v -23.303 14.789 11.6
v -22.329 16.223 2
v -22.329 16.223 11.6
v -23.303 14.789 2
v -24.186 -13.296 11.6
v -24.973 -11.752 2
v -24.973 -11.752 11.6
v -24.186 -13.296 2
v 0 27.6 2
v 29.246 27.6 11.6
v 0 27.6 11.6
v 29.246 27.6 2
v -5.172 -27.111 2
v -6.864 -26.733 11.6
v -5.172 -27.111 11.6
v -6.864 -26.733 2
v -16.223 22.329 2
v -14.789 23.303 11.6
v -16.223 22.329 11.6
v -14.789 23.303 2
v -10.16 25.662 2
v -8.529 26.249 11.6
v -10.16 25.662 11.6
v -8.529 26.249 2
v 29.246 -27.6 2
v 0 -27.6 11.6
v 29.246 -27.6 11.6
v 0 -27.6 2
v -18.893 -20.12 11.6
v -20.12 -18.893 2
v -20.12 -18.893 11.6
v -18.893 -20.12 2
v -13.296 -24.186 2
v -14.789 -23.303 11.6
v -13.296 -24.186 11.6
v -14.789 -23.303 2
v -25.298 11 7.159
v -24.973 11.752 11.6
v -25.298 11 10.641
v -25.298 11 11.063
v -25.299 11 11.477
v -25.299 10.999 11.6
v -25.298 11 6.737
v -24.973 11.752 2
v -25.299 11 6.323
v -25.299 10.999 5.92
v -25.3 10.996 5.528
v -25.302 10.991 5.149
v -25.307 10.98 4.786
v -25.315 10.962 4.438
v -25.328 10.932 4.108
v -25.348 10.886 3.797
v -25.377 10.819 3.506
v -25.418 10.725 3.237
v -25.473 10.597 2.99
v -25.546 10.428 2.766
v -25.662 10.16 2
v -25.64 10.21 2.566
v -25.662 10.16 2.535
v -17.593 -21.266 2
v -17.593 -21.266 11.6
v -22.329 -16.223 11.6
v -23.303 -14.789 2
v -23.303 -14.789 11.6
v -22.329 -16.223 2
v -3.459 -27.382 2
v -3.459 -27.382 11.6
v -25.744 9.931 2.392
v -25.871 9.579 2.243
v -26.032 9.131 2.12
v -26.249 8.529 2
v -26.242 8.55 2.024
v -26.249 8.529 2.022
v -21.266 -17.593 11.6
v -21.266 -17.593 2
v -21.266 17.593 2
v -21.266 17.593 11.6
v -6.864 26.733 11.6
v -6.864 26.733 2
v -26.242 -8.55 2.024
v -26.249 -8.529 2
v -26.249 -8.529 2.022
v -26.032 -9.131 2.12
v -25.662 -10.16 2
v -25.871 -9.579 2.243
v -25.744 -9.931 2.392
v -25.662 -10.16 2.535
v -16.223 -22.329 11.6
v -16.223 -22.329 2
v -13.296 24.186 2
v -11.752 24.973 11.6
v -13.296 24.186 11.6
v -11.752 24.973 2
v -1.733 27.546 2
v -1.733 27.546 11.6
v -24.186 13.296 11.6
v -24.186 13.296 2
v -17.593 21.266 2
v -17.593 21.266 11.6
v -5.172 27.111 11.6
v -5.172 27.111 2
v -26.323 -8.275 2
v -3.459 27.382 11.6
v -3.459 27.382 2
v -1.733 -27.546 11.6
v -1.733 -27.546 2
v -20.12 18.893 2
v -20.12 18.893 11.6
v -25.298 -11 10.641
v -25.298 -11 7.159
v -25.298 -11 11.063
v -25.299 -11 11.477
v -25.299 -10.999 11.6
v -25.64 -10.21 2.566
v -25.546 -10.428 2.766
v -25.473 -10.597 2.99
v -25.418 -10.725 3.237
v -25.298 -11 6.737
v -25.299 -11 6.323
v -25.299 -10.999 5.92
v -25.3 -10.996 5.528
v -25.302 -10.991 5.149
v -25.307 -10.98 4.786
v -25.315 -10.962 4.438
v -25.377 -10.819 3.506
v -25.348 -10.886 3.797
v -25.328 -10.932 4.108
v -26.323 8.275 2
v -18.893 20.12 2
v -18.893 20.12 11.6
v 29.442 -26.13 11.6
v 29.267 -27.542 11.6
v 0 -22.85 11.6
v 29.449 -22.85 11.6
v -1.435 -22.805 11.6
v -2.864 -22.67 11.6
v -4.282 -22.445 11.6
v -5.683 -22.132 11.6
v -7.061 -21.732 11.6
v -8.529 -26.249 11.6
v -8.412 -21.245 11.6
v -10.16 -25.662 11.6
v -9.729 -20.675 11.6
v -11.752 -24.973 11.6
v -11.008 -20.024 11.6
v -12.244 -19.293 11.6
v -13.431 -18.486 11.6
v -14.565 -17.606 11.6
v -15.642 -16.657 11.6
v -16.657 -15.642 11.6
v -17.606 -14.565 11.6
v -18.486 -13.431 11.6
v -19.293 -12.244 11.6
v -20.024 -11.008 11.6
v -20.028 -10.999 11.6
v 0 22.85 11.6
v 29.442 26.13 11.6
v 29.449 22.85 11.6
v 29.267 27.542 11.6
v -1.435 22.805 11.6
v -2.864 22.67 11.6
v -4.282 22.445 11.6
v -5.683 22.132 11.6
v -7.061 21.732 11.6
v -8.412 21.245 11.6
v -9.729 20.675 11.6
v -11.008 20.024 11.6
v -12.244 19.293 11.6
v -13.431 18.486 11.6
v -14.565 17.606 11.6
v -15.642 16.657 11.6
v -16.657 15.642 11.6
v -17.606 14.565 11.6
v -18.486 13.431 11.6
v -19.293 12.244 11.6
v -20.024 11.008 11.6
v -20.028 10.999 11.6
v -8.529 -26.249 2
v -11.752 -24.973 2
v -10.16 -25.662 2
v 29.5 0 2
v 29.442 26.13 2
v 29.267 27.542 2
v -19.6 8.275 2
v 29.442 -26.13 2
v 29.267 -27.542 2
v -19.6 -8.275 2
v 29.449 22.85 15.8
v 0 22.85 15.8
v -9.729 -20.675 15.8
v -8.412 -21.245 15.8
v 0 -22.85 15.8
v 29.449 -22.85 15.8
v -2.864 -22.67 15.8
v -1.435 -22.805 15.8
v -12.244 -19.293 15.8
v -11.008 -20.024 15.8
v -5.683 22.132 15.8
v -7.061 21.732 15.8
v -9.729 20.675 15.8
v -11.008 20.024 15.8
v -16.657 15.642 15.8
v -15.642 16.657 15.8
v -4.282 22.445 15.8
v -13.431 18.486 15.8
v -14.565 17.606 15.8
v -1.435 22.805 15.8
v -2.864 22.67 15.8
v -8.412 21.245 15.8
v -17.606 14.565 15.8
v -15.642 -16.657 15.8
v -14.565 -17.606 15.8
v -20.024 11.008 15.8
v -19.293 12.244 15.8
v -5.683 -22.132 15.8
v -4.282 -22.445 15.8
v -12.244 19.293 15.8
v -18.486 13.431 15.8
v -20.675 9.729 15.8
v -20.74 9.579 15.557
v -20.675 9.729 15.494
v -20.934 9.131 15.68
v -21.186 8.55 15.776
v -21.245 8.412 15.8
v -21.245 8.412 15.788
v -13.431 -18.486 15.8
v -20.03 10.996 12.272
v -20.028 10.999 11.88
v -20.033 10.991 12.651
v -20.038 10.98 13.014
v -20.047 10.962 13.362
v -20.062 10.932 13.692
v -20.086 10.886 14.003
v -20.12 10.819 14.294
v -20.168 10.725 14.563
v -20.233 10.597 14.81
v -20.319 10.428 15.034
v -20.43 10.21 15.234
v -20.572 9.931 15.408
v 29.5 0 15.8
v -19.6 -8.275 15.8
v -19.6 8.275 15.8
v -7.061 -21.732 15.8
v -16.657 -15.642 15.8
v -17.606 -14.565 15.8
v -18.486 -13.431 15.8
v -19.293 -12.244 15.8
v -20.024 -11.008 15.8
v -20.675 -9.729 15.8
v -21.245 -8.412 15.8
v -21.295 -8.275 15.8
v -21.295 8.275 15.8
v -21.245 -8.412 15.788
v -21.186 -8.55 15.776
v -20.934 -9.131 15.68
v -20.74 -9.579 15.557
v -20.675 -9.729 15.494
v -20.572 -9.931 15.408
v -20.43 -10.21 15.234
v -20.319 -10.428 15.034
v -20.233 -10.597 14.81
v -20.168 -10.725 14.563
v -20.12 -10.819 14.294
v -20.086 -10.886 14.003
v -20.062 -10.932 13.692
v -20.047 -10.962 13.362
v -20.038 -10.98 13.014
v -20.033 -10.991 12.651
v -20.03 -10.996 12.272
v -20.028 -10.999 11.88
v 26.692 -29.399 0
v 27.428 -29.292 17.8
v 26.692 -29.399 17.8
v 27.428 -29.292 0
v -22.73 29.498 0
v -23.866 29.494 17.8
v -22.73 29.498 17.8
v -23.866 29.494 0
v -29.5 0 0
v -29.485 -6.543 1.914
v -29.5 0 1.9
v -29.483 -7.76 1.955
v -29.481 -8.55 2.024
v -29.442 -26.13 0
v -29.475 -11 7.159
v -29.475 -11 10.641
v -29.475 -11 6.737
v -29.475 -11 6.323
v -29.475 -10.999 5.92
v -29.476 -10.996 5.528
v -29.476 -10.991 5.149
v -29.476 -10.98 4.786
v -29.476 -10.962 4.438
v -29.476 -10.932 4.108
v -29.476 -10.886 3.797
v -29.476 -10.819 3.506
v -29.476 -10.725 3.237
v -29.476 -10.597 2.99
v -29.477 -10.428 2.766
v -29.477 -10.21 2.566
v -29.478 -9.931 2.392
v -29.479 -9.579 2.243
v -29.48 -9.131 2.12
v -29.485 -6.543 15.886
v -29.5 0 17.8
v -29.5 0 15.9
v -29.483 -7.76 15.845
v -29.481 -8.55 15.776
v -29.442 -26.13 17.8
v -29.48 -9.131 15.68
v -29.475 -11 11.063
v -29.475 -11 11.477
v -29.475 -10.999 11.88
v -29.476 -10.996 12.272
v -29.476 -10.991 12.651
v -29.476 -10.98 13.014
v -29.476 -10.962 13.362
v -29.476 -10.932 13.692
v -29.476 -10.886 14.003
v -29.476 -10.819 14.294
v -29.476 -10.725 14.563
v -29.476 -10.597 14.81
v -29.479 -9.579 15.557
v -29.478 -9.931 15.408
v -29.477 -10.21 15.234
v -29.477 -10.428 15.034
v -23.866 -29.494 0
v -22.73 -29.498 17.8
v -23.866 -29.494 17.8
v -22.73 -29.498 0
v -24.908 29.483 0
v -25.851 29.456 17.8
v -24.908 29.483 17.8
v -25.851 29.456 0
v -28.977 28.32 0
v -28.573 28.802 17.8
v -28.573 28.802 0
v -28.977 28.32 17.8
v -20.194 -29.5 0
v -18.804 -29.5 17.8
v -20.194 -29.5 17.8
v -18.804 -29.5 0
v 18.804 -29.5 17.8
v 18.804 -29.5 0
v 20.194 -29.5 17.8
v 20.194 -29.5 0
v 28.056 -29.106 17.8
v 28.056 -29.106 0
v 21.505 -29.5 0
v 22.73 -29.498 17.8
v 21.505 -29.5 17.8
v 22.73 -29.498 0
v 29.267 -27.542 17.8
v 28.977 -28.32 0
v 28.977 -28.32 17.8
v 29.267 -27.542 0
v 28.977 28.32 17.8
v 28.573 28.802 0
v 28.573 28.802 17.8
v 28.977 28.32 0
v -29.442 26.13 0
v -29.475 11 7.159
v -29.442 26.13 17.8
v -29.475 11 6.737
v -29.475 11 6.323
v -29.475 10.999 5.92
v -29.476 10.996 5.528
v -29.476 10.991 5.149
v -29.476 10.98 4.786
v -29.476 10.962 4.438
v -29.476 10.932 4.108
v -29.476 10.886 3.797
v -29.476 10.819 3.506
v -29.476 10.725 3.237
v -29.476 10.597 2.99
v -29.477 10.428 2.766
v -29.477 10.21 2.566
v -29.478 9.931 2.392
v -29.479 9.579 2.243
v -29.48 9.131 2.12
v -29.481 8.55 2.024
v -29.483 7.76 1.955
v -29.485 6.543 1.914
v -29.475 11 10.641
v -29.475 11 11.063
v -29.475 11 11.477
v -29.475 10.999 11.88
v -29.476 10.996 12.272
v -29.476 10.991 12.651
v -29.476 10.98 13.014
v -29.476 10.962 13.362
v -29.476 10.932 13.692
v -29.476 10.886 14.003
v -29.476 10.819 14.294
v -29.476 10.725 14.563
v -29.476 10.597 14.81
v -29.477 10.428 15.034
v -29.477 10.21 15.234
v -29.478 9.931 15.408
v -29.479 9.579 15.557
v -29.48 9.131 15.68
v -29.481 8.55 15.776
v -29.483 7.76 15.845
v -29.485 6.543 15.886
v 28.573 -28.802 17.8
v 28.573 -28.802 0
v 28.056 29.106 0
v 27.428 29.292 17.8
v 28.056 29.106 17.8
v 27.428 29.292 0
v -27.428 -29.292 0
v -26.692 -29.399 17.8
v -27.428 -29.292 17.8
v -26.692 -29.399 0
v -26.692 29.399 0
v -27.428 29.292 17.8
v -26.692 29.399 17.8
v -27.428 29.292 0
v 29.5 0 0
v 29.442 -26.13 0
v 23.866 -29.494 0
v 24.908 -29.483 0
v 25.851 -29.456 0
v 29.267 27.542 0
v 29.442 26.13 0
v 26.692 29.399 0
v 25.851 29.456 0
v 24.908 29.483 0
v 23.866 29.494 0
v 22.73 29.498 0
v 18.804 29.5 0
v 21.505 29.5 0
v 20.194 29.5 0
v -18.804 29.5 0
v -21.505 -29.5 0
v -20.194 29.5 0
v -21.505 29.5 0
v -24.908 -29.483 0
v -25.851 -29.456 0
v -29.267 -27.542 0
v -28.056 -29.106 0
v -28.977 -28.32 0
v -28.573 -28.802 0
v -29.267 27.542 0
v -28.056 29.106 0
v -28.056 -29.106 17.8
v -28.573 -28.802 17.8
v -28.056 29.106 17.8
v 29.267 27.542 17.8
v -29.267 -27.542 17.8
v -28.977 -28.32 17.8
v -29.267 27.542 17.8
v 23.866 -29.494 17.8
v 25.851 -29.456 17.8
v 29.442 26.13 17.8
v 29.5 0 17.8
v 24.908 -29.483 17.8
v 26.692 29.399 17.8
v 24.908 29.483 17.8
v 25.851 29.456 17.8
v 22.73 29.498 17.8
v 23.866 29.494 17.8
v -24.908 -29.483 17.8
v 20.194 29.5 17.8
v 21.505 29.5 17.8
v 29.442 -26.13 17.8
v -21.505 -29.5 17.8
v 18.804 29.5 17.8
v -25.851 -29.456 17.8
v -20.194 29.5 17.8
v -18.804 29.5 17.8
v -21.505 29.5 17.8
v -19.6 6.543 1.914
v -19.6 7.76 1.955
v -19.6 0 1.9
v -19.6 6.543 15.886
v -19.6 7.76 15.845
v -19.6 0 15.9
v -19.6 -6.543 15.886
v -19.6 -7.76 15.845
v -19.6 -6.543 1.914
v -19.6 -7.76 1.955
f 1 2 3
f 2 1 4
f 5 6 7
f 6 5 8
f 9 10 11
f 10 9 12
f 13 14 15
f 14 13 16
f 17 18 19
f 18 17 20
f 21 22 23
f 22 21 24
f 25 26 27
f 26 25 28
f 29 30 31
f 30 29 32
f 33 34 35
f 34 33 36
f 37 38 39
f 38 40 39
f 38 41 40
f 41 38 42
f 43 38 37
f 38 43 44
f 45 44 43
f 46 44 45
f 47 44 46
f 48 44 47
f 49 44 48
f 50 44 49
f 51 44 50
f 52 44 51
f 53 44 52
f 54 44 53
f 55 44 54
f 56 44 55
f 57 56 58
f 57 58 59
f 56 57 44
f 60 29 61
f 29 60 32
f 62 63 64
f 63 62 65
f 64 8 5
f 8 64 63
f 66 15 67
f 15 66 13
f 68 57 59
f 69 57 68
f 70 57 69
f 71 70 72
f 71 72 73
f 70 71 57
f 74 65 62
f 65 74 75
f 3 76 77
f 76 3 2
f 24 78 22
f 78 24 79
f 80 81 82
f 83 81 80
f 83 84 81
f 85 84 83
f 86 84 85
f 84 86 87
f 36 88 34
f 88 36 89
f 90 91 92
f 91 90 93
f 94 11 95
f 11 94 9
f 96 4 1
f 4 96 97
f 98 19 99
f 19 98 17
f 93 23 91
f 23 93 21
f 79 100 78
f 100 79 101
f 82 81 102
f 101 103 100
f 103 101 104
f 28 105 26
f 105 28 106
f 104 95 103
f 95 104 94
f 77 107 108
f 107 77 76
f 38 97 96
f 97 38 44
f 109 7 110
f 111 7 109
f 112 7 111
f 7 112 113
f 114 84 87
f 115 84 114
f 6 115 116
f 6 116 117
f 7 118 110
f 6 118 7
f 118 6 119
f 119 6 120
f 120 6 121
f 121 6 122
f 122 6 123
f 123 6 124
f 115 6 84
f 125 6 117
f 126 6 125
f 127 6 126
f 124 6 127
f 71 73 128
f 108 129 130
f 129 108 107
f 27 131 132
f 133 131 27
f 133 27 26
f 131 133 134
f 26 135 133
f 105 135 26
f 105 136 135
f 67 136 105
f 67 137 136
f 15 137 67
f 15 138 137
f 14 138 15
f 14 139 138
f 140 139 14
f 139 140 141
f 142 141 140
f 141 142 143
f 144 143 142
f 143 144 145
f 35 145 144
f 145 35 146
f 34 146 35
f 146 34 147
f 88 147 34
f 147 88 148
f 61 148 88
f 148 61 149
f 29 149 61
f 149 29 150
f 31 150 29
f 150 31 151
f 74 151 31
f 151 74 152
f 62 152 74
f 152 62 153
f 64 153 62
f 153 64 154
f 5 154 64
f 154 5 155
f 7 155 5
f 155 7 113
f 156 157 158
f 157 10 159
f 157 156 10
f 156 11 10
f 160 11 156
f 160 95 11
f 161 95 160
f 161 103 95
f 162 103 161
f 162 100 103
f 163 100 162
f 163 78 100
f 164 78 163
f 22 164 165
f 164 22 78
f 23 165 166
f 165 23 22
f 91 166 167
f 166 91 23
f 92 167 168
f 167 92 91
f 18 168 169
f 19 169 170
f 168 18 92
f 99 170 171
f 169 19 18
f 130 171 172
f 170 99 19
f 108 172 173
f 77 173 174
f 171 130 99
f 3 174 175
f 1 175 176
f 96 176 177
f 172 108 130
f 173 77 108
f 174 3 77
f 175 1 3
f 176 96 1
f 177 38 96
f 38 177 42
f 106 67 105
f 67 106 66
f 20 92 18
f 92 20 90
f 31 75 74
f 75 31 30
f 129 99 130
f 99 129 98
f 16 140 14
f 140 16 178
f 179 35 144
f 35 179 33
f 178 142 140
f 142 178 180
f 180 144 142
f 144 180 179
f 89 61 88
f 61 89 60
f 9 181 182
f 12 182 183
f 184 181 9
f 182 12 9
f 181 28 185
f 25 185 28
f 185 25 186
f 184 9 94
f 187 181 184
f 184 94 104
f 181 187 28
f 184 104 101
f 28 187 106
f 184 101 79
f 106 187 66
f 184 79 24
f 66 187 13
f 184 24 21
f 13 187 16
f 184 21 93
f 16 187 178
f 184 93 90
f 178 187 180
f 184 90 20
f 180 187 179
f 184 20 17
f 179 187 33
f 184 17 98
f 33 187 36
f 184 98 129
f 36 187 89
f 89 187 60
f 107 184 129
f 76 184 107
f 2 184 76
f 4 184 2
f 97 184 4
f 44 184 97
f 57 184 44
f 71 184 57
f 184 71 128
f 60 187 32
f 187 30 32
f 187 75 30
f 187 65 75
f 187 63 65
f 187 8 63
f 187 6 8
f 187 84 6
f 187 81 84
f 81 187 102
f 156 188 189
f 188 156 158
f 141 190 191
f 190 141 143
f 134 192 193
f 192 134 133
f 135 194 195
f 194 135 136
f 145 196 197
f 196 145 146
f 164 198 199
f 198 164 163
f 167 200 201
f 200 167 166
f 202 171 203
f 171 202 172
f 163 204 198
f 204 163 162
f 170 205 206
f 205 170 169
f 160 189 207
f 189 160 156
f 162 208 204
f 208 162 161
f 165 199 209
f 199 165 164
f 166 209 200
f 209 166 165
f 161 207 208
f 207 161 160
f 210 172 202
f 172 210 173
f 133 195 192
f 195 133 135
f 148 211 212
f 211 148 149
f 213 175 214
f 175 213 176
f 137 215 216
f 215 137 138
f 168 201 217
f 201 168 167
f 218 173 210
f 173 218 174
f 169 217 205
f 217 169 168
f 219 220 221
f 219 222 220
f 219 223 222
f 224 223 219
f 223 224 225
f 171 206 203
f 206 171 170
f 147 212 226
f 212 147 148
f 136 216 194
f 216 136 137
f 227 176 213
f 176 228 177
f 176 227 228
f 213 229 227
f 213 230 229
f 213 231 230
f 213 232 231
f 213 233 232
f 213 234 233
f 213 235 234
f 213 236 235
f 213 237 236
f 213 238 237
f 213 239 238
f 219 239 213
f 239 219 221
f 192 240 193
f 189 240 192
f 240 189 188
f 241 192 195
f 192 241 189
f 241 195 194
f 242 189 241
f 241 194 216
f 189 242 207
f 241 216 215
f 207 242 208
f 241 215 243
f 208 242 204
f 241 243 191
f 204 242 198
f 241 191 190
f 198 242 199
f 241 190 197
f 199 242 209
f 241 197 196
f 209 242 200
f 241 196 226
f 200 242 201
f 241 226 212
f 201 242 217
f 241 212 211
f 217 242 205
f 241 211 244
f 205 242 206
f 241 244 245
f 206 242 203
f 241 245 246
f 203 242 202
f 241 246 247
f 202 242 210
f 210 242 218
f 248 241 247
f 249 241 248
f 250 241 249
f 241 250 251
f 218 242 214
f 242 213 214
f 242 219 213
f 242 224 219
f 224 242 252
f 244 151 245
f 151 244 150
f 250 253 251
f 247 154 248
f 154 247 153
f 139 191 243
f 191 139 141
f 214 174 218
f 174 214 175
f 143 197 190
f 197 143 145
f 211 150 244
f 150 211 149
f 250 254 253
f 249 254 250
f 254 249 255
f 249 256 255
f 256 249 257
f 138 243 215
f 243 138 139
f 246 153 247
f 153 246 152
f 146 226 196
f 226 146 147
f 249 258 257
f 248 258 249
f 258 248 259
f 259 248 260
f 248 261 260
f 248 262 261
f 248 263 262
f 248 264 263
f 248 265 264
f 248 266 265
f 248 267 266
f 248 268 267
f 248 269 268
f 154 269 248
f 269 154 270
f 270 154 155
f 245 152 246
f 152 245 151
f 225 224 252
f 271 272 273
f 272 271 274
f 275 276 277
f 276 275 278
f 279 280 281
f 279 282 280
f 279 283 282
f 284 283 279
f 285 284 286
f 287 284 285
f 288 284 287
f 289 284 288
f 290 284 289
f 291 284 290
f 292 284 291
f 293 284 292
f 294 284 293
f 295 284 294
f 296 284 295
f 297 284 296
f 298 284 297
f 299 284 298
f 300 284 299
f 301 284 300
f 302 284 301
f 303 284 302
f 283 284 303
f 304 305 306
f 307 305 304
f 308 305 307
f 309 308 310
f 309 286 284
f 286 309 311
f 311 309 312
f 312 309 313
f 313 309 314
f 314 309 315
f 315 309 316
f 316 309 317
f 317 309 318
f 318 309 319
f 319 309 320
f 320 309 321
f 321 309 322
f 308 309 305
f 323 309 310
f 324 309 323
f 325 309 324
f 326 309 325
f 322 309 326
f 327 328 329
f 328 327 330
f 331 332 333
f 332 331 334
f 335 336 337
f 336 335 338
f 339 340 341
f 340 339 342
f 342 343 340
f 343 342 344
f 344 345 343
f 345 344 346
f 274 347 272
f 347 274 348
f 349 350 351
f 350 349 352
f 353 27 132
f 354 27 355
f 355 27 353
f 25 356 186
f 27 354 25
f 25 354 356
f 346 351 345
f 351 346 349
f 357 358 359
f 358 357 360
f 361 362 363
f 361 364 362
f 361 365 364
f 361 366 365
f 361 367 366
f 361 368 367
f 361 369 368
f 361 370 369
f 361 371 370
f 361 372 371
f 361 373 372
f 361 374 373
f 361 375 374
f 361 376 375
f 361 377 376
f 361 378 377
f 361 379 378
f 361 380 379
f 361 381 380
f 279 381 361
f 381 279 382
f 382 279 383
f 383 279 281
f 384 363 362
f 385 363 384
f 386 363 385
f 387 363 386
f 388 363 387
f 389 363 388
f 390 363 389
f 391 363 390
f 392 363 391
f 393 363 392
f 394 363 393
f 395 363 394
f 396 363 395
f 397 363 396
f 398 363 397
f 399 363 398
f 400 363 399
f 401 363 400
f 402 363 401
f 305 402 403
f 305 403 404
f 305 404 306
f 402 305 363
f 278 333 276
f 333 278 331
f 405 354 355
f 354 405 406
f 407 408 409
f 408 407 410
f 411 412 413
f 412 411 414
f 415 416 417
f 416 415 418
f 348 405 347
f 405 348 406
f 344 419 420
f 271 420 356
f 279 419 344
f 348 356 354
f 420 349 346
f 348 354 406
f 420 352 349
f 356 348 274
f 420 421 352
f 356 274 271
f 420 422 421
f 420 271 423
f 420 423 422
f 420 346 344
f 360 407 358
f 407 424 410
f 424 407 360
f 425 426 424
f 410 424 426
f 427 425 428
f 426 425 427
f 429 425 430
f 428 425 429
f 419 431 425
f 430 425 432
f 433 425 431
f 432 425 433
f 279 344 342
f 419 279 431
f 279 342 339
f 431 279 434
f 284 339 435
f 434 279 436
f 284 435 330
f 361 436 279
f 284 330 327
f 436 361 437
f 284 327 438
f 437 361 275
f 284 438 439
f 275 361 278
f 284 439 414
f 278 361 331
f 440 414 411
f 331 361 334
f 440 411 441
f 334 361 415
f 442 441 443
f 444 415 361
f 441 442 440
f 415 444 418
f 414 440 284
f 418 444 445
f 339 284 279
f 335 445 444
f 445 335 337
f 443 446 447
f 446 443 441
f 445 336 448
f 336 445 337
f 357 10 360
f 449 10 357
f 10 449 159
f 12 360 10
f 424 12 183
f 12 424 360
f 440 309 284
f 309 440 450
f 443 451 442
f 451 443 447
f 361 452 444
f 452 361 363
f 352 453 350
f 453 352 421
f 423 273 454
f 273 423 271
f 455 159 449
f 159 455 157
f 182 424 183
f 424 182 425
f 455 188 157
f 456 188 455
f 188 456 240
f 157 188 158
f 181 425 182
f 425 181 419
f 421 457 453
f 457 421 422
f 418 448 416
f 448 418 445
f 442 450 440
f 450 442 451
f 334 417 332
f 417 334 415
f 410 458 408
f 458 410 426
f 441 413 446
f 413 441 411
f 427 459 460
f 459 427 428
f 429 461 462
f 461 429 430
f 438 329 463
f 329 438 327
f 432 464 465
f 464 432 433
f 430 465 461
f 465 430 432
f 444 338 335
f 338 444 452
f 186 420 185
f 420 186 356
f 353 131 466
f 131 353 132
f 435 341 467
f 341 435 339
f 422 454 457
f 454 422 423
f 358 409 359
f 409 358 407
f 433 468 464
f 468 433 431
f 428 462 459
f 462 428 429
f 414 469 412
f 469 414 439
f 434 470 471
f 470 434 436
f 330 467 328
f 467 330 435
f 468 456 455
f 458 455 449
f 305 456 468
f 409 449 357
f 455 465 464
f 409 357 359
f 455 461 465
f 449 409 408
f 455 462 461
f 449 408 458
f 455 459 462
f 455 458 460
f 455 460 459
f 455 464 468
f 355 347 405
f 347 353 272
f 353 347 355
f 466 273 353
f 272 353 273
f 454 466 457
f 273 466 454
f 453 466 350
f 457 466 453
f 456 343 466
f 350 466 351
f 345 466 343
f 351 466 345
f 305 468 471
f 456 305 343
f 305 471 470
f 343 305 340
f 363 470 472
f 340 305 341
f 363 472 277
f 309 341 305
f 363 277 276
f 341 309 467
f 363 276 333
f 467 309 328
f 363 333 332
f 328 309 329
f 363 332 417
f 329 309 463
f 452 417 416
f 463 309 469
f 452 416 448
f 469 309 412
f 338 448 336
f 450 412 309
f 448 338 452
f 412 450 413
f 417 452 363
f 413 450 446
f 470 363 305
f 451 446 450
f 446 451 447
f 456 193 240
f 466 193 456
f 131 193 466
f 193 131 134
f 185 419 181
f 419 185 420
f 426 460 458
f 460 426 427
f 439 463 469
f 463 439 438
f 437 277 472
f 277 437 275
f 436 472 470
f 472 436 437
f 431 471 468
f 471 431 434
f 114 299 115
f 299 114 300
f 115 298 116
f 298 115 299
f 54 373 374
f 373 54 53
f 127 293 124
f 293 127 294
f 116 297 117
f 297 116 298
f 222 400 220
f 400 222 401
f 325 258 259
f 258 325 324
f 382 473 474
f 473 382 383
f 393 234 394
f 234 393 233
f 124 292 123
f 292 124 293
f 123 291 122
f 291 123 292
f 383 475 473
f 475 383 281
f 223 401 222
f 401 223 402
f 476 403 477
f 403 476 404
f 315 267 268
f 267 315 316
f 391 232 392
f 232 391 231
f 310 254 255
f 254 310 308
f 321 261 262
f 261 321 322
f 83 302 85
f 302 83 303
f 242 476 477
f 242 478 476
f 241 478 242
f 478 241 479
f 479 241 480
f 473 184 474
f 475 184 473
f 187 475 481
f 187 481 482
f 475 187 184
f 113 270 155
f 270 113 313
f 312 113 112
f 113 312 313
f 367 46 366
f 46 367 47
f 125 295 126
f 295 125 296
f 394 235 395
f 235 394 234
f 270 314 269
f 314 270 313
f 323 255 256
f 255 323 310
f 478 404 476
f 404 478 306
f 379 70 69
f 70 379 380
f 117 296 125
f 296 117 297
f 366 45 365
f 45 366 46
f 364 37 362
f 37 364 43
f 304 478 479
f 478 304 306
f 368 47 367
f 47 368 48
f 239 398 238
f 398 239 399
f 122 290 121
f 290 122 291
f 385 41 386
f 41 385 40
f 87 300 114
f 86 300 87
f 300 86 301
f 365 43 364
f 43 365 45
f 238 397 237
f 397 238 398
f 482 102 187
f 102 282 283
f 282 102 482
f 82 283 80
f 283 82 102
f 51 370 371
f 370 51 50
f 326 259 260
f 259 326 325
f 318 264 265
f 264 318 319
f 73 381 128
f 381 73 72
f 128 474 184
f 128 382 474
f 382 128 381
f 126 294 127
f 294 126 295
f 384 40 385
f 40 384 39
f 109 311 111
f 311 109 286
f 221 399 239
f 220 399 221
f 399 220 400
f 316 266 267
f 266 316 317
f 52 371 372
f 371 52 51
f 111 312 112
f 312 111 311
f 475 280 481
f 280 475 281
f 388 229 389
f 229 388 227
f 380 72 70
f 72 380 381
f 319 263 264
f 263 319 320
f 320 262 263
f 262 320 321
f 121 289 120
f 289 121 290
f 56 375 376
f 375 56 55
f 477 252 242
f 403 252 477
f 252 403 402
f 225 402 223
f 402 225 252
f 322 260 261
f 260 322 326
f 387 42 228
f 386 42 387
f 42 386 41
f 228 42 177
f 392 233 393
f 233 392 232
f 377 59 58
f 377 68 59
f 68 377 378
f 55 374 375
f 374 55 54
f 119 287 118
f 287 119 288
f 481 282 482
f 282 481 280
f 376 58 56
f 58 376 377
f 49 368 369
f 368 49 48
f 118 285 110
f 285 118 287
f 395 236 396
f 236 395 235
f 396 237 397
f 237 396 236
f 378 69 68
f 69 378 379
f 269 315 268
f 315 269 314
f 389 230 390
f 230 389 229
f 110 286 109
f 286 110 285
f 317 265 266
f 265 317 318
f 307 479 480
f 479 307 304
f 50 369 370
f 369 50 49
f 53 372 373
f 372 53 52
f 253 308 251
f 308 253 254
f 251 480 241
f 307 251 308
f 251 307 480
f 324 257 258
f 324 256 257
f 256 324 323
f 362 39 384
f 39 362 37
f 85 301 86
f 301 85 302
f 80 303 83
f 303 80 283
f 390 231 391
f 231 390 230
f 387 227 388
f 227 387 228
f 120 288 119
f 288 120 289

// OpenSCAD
// file: ../../functions/reverse.scad
function reverse(lst) =
  let(max = len(lst) - 1) [for(idx = [0 : max]) lst[max - idx]];
// file: ../../modules/translate-hull-each.scad
module translate_hull_each(vec) for(idx = [0 : $children - 1]) hull() {
  children(idx);
  translate(vec) children(idx);
}
// file: ../../modules/superellipse.scad
use <../functions/reverse.scad>

module superellipse(ra = 1, rb = 1, n = 3, $fn = 100) {
  inv_n = 1 / n;
  step = 90 / $fn * 4;

  pos_quadrant_pts = [
    for(angle = [0 : step : 90])
      let(x = sin(angle) * ra, y = rb * (1 - (x / ra) ^ n) ^ inv_n) [x, y]
  ];

  rev_pos_quadrant_pts = reverse(pos_quadrant_pts);

  polygon(points = [
    each rev_pos_quadrant_pts,
    for(p = pos_quadrant_pts) [-p.x, p.y],
    for(p = rev_pos_quadrant_pts) [-p.x, -p.y],
    for(p = pos_quadrant_pts) [p.x, -p.y]
  ]);
}
// file: ../../modules/squircle.scad
use <./superellipse.scad>

module squircle(r = 1, n = 3, $fn = 100)
  superellipse(ra = r, rb = r, n = n, $fn = $fn);
// main file
use <../../modules/squircle.scad>
use <../../modules/superellipse.scad>
use <../../modules/translate-hull-each.scad>

$fn = 100;

tolerance = 0.2;

base_diameter = 55;
adapter_height = 9.6 + 4.2;

case_height = adapter_height + 4;
case_diameter = base_diameter + 4;



difference() {
  linear_extrude(height = case_height) squircle(r = case_diameter / 2, n = 25);

  translate([0, 0, (case_height - adapter_height) / 2]) translate_hull_each([40, 0]) {
    cylinder(d = base_diameter + tolerance, h = 9.6);
    translate([0, 0, 9.6 - 0.1]) cylinder(d = 45.5 + tolerance, h = 4.2 + 0.1);
  }

  translate([-case_diameter / 2 - 0.1, 0, case_height / 2])
    rotate([0, 90]) linear_extrude(height = 10)
    superellipse(ra = adapter_height / 2 + 0.1, rb = 11, n = 8);
}
